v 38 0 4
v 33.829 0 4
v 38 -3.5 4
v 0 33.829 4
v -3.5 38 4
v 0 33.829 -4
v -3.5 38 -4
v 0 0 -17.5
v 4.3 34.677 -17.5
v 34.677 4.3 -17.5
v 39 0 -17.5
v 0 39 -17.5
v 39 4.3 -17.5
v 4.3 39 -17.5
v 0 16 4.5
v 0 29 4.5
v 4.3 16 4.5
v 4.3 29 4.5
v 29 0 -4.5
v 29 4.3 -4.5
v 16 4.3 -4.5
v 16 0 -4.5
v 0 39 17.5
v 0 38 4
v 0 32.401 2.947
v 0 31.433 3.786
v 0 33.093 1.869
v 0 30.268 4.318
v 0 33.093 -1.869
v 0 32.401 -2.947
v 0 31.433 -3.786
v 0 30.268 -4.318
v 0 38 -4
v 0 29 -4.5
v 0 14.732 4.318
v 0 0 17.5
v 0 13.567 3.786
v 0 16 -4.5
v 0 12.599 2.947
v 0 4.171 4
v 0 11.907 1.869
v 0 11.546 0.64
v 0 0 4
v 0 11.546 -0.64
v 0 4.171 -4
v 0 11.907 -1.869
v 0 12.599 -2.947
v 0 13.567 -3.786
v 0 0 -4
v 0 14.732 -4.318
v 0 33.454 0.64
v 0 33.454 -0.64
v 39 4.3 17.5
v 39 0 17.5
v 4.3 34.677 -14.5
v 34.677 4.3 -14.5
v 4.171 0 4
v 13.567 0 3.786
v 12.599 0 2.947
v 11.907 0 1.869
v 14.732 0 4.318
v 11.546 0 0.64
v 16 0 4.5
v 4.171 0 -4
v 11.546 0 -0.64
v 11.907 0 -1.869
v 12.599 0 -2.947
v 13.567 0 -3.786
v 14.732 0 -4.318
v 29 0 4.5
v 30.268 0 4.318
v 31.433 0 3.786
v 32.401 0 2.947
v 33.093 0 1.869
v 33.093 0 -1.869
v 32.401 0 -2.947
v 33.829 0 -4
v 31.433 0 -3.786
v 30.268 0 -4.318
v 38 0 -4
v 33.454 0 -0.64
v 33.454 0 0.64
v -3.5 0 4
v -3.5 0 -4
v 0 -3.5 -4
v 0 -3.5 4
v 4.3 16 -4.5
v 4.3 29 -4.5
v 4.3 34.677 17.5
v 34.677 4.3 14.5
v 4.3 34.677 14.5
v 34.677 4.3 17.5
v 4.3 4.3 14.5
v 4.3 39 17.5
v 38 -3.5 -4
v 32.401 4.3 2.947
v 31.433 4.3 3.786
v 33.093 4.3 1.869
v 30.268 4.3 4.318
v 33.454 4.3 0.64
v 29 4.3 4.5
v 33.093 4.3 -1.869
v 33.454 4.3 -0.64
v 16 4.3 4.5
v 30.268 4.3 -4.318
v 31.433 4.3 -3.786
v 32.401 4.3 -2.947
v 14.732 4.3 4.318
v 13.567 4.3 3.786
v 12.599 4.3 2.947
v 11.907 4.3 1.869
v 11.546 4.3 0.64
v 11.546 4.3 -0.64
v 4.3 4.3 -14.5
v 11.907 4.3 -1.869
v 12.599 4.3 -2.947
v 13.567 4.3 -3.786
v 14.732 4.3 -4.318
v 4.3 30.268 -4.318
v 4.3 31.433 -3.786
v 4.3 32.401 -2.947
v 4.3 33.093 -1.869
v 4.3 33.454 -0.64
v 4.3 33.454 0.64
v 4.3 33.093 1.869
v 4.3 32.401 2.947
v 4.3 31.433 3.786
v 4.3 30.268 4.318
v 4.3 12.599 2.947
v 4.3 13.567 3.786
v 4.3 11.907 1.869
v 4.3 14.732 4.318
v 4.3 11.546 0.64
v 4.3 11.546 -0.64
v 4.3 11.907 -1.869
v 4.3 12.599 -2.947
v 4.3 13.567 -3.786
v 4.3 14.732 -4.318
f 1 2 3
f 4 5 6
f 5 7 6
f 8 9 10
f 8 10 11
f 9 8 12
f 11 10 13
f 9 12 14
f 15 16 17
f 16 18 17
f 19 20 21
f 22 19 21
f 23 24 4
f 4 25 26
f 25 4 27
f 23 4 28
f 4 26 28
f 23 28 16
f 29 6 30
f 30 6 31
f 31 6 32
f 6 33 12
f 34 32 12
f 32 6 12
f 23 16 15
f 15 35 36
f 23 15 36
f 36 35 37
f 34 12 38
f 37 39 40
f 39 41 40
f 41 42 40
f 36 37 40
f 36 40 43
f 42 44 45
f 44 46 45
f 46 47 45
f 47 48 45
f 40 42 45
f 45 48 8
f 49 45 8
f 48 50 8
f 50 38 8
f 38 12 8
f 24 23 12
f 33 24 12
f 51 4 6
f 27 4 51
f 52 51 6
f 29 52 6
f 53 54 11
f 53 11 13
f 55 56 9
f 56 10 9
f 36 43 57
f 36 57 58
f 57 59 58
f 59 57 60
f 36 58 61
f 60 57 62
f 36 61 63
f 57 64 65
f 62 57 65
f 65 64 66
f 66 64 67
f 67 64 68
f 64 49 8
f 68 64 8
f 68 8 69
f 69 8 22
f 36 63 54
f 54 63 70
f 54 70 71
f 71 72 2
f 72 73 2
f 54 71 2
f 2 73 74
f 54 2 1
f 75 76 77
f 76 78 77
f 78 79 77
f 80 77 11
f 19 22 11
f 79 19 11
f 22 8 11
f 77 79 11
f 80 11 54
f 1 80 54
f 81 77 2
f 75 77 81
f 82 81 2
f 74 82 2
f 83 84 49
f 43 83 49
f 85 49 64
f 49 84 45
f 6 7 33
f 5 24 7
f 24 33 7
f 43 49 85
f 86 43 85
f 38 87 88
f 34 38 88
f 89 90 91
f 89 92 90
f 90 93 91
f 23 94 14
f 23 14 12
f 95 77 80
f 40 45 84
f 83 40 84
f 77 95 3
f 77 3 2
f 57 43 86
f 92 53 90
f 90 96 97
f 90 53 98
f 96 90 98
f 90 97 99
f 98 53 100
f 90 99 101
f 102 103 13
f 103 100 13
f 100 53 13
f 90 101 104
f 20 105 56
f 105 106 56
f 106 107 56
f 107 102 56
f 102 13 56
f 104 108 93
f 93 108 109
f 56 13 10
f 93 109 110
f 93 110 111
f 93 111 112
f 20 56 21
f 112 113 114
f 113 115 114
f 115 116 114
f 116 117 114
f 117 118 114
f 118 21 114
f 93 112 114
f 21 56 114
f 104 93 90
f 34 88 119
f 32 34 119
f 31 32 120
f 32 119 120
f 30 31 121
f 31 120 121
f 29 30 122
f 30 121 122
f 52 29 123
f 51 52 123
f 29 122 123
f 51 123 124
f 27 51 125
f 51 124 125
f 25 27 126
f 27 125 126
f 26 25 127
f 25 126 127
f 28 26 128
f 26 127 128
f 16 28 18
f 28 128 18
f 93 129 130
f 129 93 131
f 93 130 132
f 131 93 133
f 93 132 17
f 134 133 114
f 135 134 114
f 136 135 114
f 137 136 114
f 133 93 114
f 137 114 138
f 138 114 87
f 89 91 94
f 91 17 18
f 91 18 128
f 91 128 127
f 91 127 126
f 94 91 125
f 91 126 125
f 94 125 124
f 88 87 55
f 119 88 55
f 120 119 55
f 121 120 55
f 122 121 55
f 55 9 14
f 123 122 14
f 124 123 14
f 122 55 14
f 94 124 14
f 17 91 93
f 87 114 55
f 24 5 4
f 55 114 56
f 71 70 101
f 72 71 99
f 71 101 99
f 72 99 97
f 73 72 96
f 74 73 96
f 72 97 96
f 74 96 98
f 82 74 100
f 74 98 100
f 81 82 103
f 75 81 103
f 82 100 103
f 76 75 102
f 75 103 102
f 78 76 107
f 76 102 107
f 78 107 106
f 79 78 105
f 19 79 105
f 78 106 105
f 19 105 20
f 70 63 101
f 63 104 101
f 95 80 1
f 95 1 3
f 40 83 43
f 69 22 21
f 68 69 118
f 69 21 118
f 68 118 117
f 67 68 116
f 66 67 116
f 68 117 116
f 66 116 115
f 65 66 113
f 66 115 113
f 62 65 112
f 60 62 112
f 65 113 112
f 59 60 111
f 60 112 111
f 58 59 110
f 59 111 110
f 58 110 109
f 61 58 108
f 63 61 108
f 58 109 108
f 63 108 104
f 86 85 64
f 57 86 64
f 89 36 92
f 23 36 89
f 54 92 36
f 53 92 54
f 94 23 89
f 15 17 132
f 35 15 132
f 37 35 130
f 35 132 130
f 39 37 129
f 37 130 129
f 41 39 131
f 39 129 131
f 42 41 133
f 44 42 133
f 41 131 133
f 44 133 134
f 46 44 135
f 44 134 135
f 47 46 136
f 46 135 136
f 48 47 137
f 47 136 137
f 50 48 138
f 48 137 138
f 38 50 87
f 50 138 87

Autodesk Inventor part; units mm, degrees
ref_plane "YZ Plane" through (0, 0, 0) normal (1, 0, 0) x (0, 1, 0)
ref_plane "XY Plane" through (0, 0, 0) normal (0, 0, 1) x (1, 0, 0)
sketch "Skizze1" plane through (0, 0, 0) normal (0, 0, 1) x (1, 0, 0)
  line L0 (-12, 0) -> (47.5, 0) projected
  line L1 (0, 47.5) -> (0, -12) projected
  line L2 (39, 0) -> (39, 4.3)
  line L3 (39, 4.3) -> (34.6772, 4.3)
  line L4 (34.6772, 4.3) -> (4.3, 34.6772)
  line L5 (4.3, 34.6772) -> (4.3, 39)
  line L6 (4.3, 39) -> (0, 39)
  line L7 (0, 39) -> (0, 0)
  line L8 (0, 0) -> (39, 0)
  line L9 (34.6772, 4.3) -> (4.3, 4.3)
  line L10 (4.3, 4.3) -> (4.3, 34.6772)
  line L11 (0, 38) -> (-3.5, 38)
  line L12 (-3.5, 38) -> (0, 33.8289)
  line L13 (0, 4.1711) -> (-3.5, 0)
  line L14 (0, 0) -> (-3.5, 0)
  line L15 (0, 0) -> (0, -3.5)
  line L16 (0, -3.5) -> (4.1711, 0)
  line L17 (38, 0) -> (38, -3.5)
  line L18 (38, -3.5) -> (33.8289, 0)
  dimension "d0" = 39
  dimension "d1" = 39
  dimension "d2" = 4.3
  dimension "d3" = 4.3
  dimension "d4" = 45
  dimension "d7" = 40
  dimension "d8" = 40
  dimension "d9" = 40
  dimension "d10" = 40
  dimension "d11" = 3.5
  dimension "d12" = 3.5
  dimension "d13" = 3.5
  dimension "d14" = 3.5
  dimension "d15" = 1
  dimension "d16" = 1
extrude "Extrusion1" add sketch "Skizze1" along normal mid plane 35 contours L1 L6 L5 L10 L9 L3 L2 L0
extrude "Extrusion2" add sketch "Skizze1" along normal mid plane 8 contours L13 L1 L0 | L0 L16 L1 | L12 L11 L1 | L0 L17 L18
extrude "Extrusion3" add sketch "Skizze1" against normal blind 3 from surface at 17.5 contours L4 L9 L10
extrude "Extrusion4" add sketch "Skizze1" along normal blind 3 from surface at -17.5 contours L4 L9 L10
sketch "Skizze2" plane through (4.3, 39, 17.5) normal (1, 0, 0) x (0, 0, -1)
  line L0 (0, 0) -> (35, 0) projected
  line L1 (0, -4.3228) -> (0, 0) projected
  line L2 (0, -4.3228) -> (3, -4.3228) projected
  line L3 (3, -34.7) -> (3, -4.3228) projected
  line L4 (32, -34.7) -> (3, -34.7) projected
  line L5 (32, -4.3228) -> (32, -34.7) projected
  line L6 (32, -4.3228) -> (35, -4.3228) projected
  line L7 (35, 0) -> (35, -4.3228) projected
  line L8 (32, -4.3228) -> (35, -4.3228) construction
  line L9 (0, -4.3228) -> (3, -4.3228) construction
  line L10 (32, -34.7) -> (3, -34.7) construction
  line L11 (17.5, -23) -> (17.5, -10) construction
  line L12 (22, -23) -> (22, -10)
  line L13 (13, -10) -> (13, -23)
  arc A0 (13, -23) -> (22, -23) centre (17.5, -23) ccw
  arc A1 (22, -10) -> (13, -10) centre (17.5, -10) ccw
  line L14 (35, 0) -> (0, 0) construction
  line L15 (17.5, 0) -> (17.5, -49.0584) construction
  point P0 (17.5, -39)
  point P1 (17.5, -16.5)
  point P2 (17.5, -27.5)
  point P3 (17.5, -5.5)
  dimension "d23" = 6.5
  dimension "d24" = 9
  dimension "d25" = 22
  dimension "d26" = 5.5
extrude "Extrusion5" cut sketch "Skizze2" against normal blind 5 contours A0 L13 A1 L12
ref_plane "Arbeitsebene1" through (4.3, 4.3, 0) normal (-0.7071, 0.7071, 0) x (0, 0, 1)
mirror "Spiegeln1" about plane through (4.3, 4.3, 0) normal (-0.7071, 0.7071, 0) of "Extrusion5"
equation "\"d12\" = d11"
equation "\"d13\" = d11"
equation "\"d14\" = d11"
properties part number "Bracket - Cast 90 deg corner 4040"
